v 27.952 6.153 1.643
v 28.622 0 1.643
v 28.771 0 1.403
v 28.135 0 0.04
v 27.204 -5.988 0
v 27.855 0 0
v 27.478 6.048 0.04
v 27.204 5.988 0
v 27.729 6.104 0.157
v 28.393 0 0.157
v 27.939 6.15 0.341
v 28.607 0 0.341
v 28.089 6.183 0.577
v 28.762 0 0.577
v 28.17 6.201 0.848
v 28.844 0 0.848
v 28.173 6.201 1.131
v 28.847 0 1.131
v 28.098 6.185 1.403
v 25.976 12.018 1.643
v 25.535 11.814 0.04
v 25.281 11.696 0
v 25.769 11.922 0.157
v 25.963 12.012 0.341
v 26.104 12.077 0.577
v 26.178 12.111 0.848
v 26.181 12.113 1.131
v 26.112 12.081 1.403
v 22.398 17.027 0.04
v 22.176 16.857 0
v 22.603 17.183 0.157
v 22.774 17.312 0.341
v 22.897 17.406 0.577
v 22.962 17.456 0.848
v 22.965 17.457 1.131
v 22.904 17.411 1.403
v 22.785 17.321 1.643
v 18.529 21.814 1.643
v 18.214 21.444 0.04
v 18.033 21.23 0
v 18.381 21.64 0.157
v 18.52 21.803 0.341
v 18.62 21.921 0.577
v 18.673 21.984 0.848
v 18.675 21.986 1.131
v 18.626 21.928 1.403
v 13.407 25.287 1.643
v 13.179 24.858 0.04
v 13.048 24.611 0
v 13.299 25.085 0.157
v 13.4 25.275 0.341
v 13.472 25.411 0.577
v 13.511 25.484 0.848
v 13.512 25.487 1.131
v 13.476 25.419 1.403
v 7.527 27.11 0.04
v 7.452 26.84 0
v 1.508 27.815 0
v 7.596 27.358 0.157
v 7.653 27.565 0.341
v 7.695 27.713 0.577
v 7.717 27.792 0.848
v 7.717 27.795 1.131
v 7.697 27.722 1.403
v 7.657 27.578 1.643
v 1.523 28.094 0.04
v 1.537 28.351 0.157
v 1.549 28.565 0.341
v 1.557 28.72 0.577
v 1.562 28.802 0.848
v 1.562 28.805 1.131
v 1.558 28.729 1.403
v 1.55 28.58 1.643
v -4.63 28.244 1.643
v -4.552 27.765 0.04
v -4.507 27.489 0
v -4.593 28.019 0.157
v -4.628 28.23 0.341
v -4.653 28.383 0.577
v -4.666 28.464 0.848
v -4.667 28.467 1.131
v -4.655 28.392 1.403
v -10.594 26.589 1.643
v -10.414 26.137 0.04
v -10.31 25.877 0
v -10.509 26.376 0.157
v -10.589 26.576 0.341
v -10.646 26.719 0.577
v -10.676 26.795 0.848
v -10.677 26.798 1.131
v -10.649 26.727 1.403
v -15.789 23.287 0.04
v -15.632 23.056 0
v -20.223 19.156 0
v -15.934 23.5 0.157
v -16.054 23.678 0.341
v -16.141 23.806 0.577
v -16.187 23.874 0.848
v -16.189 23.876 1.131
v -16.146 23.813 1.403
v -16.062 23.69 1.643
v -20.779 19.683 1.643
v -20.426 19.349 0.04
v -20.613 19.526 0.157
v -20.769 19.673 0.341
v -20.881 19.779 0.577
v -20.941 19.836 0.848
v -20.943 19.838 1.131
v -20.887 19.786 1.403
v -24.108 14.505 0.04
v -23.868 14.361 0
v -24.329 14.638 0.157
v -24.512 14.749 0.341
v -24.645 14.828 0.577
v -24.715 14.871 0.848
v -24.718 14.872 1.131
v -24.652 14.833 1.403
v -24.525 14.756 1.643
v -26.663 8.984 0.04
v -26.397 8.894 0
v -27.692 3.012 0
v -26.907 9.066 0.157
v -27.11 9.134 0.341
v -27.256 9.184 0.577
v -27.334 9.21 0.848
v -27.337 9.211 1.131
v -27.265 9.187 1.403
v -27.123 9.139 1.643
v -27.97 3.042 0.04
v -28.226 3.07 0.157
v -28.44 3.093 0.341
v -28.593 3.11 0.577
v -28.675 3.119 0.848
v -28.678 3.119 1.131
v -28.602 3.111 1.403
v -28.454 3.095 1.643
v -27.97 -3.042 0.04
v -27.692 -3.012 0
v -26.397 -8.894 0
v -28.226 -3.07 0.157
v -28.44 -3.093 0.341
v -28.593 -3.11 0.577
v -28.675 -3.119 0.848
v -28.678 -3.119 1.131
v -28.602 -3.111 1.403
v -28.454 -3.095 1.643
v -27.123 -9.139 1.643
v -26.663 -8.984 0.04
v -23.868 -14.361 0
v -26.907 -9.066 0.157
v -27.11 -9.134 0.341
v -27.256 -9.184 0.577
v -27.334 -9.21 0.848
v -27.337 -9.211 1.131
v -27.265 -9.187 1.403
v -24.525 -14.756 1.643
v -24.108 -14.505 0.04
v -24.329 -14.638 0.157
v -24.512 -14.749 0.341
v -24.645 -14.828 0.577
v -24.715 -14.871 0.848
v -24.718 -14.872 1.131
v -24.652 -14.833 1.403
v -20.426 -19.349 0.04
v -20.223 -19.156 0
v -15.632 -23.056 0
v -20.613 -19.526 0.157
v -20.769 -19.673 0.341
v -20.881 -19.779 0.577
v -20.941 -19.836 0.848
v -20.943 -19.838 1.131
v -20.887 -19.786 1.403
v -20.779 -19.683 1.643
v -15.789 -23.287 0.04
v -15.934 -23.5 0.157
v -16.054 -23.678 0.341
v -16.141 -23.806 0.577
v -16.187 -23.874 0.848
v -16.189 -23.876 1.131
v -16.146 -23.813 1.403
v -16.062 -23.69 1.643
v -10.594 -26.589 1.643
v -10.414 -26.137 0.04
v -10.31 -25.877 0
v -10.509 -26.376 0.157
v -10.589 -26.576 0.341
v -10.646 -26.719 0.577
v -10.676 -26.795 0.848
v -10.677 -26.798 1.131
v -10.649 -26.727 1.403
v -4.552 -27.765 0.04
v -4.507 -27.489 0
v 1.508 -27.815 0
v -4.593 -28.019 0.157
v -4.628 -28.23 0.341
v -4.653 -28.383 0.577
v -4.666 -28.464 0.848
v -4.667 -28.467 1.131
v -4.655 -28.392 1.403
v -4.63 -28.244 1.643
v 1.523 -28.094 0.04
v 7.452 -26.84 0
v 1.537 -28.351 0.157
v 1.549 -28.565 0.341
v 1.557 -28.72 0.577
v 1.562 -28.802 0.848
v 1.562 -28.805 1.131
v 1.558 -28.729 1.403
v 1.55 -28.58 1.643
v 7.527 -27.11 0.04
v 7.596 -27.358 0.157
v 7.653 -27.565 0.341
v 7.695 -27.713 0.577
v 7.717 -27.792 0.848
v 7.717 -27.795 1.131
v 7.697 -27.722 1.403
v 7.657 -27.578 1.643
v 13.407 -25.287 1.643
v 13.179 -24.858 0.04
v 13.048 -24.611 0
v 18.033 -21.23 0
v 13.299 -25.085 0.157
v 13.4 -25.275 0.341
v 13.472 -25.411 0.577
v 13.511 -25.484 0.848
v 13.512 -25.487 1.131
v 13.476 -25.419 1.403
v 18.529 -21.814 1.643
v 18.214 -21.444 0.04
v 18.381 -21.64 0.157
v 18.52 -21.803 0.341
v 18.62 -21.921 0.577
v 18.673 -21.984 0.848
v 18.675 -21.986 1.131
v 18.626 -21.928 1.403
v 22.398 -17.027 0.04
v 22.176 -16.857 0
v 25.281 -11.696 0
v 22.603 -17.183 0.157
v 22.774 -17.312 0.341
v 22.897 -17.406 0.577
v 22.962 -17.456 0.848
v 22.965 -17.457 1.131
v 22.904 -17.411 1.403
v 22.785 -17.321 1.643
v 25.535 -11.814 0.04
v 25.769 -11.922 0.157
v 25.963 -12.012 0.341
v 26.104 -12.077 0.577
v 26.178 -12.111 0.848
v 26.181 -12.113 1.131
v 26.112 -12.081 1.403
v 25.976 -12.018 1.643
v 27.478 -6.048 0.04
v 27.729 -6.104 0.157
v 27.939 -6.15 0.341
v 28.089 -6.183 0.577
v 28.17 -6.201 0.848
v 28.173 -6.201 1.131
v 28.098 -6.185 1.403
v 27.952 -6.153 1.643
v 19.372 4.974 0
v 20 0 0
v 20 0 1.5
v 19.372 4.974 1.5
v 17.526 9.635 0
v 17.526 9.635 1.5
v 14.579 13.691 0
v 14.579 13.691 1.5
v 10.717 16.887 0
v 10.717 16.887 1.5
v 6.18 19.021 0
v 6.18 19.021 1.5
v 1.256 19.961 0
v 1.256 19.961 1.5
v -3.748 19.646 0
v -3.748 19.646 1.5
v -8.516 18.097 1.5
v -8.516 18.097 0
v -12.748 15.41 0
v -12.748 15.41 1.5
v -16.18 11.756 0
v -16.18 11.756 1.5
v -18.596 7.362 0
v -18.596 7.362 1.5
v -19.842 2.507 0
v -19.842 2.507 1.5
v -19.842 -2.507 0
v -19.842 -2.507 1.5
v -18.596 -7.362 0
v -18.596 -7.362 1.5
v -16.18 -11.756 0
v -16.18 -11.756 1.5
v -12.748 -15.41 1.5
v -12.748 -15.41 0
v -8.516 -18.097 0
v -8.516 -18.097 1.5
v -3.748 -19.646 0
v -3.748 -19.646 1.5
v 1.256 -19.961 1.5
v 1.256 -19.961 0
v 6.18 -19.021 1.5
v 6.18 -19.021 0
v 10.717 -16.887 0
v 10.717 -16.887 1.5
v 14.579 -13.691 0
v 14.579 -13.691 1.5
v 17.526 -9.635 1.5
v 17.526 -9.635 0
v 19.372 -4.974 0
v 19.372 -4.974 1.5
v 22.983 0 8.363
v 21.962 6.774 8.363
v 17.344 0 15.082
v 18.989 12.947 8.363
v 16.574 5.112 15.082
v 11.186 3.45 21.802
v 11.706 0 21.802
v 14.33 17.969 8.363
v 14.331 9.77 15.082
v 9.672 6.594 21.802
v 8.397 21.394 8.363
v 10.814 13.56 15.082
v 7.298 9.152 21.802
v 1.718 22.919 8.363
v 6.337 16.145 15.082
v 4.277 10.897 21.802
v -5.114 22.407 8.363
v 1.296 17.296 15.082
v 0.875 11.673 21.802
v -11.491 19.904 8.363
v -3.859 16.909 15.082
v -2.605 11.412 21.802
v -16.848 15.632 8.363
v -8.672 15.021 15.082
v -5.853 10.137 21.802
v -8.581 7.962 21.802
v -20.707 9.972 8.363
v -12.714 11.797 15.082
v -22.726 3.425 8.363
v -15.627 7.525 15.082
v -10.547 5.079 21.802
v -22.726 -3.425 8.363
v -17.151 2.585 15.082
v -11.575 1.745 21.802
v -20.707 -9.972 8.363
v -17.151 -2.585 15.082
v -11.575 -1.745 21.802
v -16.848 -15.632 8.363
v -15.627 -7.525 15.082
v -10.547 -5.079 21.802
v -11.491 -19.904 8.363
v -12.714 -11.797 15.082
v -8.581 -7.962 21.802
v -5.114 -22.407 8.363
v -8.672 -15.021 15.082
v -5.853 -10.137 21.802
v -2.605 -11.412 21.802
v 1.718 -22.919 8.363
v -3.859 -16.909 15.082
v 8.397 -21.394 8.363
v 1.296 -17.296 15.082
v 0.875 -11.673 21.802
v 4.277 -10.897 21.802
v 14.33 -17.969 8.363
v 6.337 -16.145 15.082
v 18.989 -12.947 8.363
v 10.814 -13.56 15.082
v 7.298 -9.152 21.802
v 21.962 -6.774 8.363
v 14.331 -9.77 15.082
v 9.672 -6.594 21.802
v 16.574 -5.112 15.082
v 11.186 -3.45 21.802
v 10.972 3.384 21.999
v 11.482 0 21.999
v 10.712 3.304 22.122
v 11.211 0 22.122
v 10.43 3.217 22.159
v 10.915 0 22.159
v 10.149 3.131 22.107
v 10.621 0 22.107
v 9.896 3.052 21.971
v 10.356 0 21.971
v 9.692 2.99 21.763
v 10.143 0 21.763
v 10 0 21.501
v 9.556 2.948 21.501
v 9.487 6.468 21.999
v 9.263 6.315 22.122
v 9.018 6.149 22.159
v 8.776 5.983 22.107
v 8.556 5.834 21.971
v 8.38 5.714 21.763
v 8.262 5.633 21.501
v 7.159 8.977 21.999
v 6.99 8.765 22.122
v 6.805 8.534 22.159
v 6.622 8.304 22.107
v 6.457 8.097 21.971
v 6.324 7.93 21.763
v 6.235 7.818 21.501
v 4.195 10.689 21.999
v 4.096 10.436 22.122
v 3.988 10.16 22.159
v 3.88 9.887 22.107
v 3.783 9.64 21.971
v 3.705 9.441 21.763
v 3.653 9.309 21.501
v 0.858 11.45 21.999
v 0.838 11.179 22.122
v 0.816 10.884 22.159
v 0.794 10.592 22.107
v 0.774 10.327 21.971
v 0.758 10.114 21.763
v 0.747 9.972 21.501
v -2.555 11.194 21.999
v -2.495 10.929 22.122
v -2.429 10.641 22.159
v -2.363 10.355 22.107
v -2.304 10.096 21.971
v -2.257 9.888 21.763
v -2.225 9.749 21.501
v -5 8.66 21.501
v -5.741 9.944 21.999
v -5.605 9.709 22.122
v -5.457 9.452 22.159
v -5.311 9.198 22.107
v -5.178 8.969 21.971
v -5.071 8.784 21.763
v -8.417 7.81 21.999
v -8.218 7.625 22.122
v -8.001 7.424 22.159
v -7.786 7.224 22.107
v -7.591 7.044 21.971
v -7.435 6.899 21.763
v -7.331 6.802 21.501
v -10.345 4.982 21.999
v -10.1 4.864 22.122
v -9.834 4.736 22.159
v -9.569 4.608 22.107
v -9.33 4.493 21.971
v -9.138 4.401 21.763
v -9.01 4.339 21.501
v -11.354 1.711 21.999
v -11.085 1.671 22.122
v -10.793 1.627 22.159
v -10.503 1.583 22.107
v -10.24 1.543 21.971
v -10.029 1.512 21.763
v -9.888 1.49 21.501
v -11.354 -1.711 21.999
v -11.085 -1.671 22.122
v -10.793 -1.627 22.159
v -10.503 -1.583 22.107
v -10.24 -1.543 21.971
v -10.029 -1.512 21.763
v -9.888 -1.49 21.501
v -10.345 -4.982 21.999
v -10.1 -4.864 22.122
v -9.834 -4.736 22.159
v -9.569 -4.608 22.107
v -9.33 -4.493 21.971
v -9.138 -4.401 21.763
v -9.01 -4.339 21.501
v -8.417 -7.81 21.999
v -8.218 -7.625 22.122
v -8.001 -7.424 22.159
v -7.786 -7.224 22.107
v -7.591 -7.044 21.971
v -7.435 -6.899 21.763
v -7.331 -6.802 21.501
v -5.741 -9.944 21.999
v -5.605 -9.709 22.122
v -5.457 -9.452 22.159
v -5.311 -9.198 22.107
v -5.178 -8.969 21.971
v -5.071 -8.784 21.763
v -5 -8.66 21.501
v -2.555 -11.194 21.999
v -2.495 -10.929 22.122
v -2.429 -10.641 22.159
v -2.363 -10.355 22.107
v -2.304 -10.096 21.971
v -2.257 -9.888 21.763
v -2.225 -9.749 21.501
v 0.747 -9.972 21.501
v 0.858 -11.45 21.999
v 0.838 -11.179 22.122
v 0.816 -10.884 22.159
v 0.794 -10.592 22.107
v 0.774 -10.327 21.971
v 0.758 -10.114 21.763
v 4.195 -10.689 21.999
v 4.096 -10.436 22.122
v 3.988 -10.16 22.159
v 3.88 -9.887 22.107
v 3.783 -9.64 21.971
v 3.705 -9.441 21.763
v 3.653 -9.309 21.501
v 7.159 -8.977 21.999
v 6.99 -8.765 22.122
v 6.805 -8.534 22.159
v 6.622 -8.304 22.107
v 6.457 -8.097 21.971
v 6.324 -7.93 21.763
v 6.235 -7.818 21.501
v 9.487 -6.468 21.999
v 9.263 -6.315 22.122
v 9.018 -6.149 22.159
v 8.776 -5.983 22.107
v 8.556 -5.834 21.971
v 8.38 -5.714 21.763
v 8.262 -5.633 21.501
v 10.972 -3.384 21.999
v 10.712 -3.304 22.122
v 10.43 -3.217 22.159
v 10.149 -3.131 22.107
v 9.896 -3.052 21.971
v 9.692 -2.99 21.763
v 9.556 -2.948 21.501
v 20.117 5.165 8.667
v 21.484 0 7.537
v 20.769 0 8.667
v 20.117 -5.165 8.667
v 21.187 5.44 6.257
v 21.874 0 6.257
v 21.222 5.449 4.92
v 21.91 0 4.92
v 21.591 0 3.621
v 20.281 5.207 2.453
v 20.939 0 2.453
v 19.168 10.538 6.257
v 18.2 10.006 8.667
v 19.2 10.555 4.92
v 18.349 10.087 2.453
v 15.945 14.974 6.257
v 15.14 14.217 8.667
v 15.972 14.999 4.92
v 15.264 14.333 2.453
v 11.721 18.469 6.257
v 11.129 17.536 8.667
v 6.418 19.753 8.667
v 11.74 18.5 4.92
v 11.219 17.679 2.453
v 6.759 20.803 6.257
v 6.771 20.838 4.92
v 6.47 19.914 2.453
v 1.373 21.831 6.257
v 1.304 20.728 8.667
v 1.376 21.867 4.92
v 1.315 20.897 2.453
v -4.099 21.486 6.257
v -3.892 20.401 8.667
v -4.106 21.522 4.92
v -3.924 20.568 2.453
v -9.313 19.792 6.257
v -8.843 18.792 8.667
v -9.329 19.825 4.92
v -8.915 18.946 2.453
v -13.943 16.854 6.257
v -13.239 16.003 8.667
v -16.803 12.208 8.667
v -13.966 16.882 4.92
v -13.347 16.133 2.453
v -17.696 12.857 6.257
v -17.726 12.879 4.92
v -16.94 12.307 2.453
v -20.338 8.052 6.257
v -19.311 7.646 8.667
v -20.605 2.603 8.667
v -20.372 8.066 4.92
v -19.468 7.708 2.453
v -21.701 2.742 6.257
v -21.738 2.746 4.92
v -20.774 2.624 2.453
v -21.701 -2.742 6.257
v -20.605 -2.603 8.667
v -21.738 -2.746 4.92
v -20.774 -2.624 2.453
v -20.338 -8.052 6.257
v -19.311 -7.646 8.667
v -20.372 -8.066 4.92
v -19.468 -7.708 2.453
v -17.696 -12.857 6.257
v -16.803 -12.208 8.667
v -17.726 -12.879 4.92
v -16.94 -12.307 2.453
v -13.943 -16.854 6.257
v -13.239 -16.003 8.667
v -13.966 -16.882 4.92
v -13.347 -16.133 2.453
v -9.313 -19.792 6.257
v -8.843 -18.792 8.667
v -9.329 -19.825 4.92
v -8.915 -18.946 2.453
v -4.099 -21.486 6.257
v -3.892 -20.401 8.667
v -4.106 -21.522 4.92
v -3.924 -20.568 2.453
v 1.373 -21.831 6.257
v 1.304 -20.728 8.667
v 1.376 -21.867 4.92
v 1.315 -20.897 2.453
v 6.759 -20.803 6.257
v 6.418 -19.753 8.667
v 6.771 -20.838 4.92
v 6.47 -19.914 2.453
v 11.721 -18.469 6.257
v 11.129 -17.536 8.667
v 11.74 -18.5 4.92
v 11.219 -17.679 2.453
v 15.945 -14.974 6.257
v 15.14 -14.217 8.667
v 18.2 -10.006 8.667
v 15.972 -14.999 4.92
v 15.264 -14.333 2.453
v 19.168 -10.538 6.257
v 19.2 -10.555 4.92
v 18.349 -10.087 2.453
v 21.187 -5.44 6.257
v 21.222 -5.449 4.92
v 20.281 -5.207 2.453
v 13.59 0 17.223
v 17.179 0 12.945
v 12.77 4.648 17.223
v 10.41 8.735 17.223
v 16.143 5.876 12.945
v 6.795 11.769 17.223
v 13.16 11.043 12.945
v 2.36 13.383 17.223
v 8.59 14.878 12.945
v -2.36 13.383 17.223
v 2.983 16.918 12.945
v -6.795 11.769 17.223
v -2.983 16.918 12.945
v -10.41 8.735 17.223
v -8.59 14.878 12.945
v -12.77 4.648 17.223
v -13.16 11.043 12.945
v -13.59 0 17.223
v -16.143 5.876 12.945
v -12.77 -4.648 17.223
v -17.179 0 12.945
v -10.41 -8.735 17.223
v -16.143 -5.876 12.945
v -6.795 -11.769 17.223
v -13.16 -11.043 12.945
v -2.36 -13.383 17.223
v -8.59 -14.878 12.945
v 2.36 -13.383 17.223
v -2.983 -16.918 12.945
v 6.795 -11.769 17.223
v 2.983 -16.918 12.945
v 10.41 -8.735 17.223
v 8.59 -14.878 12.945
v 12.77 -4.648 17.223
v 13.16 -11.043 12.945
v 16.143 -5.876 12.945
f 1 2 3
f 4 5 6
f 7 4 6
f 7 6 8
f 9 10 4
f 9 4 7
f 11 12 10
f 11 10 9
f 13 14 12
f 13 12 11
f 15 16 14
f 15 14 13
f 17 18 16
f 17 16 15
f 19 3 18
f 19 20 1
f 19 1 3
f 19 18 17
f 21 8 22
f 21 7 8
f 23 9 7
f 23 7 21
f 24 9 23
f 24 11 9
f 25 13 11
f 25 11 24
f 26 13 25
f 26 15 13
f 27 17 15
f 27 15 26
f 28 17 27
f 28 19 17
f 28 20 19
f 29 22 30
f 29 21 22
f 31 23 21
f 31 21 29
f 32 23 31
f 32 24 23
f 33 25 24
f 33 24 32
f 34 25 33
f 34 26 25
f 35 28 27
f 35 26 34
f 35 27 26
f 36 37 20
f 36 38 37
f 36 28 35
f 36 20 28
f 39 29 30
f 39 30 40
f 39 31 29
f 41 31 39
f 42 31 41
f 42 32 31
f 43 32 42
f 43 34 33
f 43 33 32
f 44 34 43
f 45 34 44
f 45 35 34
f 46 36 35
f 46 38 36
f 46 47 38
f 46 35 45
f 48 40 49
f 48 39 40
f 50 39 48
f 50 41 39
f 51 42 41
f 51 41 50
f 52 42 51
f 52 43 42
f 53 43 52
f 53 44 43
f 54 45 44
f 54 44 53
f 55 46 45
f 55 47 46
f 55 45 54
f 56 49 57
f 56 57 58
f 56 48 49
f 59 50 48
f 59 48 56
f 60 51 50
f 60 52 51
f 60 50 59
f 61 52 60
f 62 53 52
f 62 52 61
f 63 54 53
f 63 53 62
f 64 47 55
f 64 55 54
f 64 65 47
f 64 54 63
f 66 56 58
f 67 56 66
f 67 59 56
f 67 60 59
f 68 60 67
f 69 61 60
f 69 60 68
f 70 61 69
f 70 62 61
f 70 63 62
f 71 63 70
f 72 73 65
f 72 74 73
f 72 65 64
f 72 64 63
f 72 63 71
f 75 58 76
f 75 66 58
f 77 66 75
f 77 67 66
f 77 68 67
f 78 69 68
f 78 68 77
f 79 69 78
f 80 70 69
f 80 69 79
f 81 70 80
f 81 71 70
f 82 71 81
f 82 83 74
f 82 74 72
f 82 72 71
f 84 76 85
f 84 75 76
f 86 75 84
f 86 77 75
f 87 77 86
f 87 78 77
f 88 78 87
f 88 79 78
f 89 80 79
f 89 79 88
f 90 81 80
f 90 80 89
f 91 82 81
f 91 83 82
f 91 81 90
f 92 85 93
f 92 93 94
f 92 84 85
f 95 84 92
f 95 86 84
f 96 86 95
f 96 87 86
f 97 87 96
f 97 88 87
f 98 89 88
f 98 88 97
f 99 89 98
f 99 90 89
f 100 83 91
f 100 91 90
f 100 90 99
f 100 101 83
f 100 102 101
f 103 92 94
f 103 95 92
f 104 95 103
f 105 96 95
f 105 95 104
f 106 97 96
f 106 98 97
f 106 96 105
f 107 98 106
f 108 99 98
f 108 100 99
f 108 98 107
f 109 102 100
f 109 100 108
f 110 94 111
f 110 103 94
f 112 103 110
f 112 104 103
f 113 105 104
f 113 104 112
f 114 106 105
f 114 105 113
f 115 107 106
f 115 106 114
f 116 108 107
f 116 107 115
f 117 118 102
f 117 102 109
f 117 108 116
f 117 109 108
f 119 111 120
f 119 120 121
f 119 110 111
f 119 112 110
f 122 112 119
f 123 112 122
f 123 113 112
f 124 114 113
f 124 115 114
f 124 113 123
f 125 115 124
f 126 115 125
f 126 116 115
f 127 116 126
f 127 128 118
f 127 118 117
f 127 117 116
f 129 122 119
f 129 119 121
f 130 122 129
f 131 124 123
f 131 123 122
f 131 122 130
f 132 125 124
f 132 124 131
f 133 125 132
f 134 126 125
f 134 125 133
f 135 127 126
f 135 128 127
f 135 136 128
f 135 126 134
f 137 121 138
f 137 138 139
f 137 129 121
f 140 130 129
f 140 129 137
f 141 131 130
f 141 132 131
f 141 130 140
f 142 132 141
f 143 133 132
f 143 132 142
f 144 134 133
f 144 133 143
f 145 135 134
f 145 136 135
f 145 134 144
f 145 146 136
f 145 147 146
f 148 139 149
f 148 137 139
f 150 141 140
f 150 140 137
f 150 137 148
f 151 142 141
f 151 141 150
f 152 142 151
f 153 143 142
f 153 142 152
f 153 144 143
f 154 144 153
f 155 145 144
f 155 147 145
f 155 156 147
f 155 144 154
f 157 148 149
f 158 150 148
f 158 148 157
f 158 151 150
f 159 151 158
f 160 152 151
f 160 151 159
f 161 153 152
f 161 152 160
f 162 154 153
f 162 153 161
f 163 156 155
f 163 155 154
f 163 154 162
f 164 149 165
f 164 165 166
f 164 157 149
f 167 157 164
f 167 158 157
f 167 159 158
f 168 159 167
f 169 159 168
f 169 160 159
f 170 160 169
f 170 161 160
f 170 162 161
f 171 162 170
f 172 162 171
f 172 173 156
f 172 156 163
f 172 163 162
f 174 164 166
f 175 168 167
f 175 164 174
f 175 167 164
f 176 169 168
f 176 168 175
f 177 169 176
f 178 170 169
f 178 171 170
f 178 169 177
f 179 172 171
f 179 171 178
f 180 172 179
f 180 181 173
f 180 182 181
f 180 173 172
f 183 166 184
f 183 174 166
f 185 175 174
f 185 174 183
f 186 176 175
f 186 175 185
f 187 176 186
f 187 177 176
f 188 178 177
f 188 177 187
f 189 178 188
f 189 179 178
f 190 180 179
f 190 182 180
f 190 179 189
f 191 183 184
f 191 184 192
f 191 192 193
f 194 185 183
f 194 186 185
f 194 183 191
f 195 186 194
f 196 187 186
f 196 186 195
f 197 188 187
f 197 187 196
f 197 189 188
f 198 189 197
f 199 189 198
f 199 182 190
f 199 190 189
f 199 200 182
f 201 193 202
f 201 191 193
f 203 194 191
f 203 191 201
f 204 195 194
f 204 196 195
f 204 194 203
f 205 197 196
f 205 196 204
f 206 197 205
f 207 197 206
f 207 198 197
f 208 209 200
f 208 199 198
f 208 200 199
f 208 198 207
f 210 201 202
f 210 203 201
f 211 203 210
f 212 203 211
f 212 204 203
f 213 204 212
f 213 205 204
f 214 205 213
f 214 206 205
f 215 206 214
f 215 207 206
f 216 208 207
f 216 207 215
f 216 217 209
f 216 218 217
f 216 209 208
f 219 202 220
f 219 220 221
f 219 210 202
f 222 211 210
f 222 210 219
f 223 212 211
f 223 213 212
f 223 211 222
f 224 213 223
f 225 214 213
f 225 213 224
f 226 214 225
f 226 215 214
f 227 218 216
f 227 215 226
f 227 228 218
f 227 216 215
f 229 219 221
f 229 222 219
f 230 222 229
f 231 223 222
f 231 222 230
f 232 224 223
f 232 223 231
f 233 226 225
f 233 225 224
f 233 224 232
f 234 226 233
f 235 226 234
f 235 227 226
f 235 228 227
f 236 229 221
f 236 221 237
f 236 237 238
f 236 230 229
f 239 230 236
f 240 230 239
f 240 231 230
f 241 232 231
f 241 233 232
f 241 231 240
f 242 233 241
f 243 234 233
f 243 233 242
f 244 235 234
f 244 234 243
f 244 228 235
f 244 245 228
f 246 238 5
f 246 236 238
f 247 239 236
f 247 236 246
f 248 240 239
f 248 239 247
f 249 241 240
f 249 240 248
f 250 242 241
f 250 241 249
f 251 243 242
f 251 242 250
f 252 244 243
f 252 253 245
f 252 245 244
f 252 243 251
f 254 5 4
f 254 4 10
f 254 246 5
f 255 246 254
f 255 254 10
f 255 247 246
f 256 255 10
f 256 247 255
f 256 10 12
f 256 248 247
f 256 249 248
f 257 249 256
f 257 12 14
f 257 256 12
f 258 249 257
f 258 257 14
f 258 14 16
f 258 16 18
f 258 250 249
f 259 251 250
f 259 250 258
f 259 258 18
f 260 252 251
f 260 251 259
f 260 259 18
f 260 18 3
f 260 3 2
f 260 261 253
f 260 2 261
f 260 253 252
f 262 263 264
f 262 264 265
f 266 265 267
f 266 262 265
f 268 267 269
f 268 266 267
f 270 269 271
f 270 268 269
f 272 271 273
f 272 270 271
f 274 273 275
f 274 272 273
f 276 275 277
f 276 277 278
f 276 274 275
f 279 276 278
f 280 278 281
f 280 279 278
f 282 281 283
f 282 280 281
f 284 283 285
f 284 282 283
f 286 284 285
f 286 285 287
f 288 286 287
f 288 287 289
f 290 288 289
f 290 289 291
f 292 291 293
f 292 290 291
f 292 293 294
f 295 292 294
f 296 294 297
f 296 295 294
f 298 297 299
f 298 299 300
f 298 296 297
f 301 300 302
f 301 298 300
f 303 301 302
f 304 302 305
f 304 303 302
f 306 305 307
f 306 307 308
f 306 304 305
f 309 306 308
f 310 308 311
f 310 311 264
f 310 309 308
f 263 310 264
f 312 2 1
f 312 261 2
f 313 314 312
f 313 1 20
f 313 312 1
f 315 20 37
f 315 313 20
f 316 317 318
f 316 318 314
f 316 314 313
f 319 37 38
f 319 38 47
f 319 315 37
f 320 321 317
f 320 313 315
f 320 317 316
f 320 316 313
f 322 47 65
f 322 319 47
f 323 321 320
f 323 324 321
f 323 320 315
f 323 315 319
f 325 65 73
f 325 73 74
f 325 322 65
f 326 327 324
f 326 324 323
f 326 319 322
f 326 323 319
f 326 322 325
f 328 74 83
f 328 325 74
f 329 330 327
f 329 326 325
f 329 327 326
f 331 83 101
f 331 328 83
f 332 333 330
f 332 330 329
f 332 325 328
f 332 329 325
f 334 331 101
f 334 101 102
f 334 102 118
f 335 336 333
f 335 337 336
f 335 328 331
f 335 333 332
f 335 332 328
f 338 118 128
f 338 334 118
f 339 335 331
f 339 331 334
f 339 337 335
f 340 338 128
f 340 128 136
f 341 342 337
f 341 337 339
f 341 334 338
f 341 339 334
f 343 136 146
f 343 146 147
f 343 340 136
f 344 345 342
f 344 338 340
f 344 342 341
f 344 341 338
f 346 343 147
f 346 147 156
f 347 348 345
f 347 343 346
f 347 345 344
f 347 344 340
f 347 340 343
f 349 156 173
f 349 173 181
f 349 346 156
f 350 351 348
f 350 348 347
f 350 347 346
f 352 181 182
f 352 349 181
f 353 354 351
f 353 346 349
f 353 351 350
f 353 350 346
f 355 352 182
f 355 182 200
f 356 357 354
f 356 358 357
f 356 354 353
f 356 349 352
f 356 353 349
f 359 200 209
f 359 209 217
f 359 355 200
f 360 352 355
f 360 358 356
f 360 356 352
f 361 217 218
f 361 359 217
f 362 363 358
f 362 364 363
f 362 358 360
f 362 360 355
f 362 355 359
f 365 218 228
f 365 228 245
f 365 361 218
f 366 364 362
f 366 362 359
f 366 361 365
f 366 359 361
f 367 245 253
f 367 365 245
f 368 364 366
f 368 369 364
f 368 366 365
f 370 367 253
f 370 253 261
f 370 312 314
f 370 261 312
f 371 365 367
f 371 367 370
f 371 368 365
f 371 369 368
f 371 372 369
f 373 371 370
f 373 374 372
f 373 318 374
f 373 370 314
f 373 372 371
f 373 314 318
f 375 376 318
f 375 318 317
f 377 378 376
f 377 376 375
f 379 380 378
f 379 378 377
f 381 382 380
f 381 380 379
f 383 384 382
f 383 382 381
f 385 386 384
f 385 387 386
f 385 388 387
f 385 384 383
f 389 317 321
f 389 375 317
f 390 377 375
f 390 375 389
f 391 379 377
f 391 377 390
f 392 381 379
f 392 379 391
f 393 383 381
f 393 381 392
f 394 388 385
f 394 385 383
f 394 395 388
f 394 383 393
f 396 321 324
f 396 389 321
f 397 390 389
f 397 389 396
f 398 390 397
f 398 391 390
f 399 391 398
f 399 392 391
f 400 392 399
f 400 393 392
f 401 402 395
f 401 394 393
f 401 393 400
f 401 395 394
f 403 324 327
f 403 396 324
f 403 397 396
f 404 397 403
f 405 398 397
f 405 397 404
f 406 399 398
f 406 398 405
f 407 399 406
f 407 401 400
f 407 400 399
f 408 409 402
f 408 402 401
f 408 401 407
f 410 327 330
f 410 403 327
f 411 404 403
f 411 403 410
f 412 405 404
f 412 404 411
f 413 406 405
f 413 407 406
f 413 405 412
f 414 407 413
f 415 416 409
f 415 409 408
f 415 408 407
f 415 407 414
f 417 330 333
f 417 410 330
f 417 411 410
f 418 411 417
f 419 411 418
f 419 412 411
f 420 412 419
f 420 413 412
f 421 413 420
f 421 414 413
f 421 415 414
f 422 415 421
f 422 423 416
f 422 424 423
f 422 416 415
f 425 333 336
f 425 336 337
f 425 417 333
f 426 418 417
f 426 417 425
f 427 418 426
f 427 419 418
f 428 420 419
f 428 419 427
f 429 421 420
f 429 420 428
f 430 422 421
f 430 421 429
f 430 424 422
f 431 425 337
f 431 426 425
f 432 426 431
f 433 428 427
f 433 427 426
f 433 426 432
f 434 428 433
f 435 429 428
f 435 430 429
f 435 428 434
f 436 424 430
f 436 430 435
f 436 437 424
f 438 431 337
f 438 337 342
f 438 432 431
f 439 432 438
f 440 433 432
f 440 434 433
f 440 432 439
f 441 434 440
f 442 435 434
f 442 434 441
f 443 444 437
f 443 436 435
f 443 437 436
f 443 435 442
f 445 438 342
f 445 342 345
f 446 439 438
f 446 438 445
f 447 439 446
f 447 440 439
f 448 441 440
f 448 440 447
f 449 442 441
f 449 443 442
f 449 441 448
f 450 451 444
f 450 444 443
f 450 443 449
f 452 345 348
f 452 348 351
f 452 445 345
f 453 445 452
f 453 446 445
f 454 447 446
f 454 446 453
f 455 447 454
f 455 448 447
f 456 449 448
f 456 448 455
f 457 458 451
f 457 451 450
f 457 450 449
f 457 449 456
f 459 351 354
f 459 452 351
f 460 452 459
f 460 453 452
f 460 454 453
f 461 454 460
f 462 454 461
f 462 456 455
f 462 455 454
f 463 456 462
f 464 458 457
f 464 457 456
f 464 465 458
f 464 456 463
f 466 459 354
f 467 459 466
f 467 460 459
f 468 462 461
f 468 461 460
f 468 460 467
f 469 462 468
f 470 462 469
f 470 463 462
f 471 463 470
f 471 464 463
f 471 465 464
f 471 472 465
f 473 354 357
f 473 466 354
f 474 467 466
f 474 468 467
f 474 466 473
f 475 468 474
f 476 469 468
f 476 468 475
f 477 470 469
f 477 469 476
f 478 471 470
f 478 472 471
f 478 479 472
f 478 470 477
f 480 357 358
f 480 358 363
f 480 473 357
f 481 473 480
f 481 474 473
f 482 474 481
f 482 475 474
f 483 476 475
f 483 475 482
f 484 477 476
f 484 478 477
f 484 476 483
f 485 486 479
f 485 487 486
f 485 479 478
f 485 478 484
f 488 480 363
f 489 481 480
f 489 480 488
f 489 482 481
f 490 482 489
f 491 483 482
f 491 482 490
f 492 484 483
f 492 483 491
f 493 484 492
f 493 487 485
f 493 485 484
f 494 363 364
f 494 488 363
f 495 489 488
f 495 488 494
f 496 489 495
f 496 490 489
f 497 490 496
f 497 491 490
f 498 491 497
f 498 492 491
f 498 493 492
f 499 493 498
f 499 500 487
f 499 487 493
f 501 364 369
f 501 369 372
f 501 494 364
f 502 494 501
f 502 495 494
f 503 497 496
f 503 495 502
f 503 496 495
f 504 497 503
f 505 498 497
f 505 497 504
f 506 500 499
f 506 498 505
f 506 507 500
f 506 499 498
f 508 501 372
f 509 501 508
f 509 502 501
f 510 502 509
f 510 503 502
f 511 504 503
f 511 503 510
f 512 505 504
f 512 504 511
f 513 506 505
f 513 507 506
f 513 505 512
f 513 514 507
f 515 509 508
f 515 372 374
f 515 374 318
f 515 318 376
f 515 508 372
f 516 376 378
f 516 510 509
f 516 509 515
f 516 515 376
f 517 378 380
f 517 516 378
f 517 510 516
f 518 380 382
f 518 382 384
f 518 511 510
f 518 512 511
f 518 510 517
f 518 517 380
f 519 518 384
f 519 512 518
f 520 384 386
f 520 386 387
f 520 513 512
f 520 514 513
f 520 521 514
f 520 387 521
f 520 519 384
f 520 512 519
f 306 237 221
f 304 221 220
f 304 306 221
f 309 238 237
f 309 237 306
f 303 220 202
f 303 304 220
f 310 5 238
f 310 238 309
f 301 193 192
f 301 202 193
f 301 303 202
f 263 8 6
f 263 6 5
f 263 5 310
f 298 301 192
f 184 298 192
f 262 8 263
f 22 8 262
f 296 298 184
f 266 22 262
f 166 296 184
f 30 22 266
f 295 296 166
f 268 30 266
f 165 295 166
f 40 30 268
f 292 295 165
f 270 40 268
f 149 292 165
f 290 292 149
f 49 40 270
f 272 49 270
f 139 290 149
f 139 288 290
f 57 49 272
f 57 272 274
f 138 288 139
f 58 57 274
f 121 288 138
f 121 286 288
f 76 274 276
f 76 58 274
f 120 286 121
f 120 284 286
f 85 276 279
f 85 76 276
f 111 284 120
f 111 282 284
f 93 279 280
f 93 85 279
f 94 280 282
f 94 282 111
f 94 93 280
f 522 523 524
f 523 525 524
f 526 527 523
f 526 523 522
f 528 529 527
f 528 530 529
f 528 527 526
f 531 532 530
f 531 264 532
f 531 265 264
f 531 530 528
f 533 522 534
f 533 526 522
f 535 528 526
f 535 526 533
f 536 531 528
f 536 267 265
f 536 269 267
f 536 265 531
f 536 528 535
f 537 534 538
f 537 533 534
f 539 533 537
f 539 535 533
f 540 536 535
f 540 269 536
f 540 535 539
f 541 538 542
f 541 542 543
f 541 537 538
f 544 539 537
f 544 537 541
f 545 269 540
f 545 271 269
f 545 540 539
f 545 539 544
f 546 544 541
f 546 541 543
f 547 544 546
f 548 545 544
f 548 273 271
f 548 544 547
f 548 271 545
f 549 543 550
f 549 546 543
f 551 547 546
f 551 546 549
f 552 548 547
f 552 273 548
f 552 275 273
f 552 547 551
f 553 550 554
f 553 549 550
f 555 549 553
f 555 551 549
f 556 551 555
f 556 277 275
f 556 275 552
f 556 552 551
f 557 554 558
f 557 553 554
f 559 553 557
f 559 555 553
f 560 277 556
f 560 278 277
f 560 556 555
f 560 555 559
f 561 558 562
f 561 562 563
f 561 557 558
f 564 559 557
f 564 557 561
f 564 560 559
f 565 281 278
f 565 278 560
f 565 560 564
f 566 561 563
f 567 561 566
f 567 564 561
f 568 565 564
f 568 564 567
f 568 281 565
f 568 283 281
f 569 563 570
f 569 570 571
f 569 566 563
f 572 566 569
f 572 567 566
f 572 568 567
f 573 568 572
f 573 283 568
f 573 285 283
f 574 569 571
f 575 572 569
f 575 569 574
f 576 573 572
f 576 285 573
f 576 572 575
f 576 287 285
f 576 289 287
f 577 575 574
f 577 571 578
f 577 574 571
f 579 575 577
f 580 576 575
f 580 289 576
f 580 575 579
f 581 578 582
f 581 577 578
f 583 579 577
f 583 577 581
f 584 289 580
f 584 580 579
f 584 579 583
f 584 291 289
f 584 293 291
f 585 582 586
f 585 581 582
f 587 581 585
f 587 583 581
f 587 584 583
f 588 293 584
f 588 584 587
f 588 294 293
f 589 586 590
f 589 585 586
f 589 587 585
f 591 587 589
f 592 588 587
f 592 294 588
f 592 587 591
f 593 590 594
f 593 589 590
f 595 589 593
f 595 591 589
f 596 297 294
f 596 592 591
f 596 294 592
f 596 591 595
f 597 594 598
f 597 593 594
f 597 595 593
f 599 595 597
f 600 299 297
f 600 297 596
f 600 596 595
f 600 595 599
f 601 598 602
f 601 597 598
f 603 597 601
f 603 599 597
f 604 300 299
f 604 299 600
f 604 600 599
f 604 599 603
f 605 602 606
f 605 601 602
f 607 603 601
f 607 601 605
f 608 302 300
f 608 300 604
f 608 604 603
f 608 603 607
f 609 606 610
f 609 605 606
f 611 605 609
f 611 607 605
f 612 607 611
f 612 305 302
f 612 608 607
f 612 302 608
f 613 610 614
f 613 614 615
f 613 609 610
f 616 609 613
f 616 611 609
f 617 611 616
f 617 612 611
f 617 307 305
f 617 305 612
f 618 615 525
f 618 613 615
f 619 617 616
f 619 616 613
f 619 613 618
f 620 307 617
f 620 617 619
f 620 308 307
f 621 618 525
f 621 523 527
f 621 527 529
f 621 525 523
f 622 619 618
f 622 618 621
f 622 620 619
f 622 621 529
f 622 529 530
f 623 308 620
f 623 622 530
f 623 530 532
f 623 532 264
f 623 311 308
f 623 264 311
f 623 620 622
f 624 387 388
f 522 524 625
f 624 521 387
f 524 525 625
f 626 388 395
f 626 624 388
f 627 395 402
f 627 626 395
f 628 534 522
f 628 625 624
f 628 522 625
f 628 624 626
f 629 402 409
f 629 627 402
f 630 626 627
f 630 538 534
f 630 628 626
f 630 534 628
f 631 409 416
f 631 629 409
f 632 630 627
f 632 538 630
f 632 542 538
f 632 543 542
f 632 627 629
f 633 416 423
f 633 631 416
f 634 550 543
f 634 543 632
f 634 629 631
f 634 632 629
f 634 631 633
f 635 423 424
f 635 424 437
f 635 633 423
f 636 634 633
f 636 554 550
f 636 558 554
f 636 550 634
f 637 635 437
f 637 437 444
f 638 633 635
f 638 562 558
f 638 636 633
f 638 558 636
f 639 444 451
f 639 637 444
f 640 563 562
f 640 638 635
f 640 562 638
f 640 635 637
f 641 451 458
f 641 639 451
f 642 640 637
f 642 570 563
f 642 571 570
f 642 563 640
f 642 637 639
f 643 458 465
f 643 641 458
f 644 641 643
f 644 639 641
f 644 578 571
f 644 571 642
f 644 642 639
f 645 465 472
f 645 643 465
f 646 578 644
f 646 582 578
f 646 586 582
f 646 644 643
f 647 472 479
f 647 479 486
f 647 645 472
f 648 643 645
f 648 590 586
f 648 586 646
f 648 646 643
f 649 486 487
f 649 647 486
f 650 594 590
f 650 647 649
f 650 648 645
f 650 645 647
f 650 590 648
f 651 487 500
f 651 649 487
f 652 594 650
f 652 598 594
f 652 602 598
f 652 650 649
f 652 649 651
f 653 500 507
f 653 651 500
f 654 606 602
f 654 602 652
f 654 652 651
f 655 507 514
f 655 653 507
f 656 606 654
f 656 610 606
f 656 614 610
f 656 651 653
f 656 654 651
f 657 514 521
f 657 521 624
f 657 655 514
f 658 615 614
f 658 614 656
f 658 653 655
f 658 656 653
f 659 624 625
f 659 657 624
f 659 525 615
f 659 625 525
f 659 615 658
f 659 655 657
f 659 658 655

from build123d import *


# Not quite as in the source:
# - a fillet or chamfer that OpenCascade refuses, or shapes differently, is made with other operations: its cross-section is extruded or revolved along the edge and cut away or added


with BuildPart() as f1:
    # F0 (on Front) → F1 (revolve)
    with BuildSketch(Plane.XZ):
        Polygon((20, 1.5), (20, 0), (30, 0), (10, 23.8350718519), (10, 21.5014861116), (26.7832396192, 1.5), align=None)
    revolve(axis=Axis((0, 0, 12.1238185093), (0, 0, 1)))

    # F2: fillet of radius 5 on 1 edges, made by hand

    # F2_s1 → F2_t2 (revolve)
    with BuildSketch(Plane.XZ):
        with BuildLine():
            ThreePointArc((20.7691072795, 8.6673638222), (21.9103444044, 4.9199541008), (20, 1.5))
            Line((20, 1.5), (20.0612222987, 1.4209314845))
            ThreePointArc((20.0612222987, 1.4209314845), (23.3916198096, 1.4), (26.7832396192, 1.4))
            Line((26.7832396192, 1.4), (26.8598440635, 1.564278761))
            Line((26.8598440635, 1.564278761), (20.8457117239, 8.7316425831))
            Line((20.8457117239, 8.7316425831), (20.7691072795, 8.6673638222))
        make_face()
    revolve(axis=Axis((0, 0, 1.5), (0, 0, 1)))

    # F3: fillet of radius 1 on 2 edges, made by hand

    # F3_s1 → F3_t2 (revolve, cut)
    with BuildSketch(Plane.XZ):
        with BuildLine():
            ThreePointArc((27.8554930795, 0), (28.7618008665, 0.5773817383), (28.6215375226, 1.6427876097))
            Line((28.6215375226, 1.6427876097), (28.6368584115, 1.6556433619))
            Line((28.6368584115, 1.6556433619), (30.0153208889, 0.0128557522))
            Line((30.0153208889, 0.0128557522), (30, -0.02))
            Line((30, -0.02), (27.8554930795, -0.02))
            Line((27.8554930795, -0.02), (27.8554930795, 0))
        make_face()
    revolve(axis=Axis((0, 0, 0), (0, 0, 1)), mode=Mode.SUBTRACT)

    # F3_s3 → F3_t4 (revolve, cut)
    with BuildSketch(Plane.XZ):
        with BuildLine():
            ThreePointArc((11.7057370639, 21.802253578), (10.7660444431, 22.1442737213), (10, 21.5014861116))
            Line((10, 21.5014861116), (9.9812061476, 21.5083265145))
            ThreePointArc((9.9812061476, 21.5083265145), (9.98, 22.6682789817), (9.98, 23.8350718519))
            Line((9.98, 23.8350718519), (10.0153208889, 23.8479276041))
            Line((10.0153208889, 23.8479276041), (11.7210579528, 21.8151093301))
            Line((11.7210579528, 21.8151093301), (11.7057370639, 21.802253578))
        make_face()
    revolve(axis=Axis((0, 0, 23.8350718519), (0, 0, 1)), mode=Mode.SUBTRACT)


solid = f1.part
